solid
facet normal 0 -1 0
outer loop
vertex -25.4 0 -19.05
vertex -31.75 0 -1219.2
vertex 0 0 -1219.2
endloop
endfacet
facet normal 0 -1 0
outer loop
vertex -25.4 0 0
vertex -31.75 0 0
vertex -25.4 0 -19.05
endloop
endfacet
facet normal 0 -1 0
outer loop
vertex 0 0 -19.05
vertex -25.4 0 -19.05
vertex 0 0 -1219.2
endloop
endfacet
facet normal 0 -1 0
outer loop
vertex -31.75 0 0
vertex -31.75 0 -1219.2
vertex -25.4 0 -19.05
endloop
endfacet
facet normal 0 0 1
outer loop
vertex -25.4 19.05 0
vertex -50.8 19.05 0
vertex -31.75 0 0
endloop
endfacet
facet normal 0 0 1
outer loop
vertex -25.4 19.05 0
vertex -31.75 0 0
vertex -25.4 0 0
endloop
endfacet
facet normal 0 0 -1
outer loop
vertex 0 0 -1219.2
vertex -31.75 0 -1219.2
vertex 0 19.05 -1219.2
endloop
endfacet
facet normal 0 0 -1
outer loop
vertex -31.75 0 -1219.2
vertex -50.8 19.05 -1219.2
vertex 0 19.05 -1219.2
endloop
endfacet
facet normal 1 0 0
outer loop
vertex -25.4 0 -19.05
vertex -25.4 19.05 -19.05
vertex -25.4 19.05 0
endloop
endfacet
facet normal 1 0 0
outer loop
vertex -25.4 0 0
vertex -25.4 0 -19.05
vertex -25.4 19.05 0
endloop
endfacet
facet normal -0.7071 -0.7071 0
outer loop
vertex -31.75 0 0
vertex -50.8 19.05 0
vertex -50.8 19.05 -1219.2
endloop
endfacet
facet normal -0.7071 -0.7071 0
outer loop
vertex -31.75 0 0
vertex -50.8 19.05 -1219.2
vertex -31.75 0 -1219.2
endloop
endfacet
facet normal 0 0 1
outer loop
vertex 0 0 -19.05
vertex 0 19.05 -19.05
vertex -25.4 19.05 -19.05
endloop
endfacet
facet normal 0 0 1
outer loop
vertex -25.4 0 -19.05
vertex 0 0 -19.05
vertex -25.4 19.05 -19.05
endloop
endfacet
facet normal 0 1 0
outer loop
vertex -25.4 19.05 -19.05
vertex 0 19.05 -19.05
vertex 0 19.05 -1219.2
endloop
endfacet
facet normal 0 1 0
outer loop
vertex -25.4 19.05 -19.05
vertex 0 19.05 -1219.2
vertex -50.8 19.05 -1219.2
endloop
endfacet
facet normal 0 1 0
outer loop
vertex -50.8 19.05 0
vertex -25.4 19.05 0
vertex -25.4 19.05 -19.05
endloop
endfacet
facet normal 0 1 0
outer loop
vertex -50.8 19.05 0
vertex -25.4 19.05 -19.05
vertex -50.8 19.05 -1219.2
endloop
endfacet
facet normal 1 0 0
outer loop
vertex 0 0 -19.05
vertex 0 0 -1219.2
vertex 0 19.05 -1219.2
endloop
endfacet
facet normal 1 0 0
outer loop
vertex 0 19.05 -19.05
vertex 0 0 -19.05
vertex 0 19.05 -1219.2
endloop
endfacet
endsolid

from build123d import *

# Parameters (mm, degrees)
F1_DEPTH = 1219.2
F2_W     = 25.4
F2_H     = 19.05
F3_DEPTH = 19.051


with BuildPart() as f1:
    # F0 (on Top) → F1 (new body)
    with BuildSketch(Plane.XY):
        Polygon((-31.75, 0), (0, 0), (0, 19.05), (-50.8, 19.05), align=None)
    extrude(amount=-F1_DEPTH)

    # F2 (on face) → F3 (cut, through all)
    with BuildSketch(Plane(origin=(0, 19.05, 0), x_dir=(-1, 0, 0), z_dir=(0, 1, 0))):
        with Locations((12.7, -9.525)):
            Rectangle(F2_W, F2_H)
    extrude(amount=-F3_DEPTH, mode=Mode.SUBTRACT)


solid = f1.part
